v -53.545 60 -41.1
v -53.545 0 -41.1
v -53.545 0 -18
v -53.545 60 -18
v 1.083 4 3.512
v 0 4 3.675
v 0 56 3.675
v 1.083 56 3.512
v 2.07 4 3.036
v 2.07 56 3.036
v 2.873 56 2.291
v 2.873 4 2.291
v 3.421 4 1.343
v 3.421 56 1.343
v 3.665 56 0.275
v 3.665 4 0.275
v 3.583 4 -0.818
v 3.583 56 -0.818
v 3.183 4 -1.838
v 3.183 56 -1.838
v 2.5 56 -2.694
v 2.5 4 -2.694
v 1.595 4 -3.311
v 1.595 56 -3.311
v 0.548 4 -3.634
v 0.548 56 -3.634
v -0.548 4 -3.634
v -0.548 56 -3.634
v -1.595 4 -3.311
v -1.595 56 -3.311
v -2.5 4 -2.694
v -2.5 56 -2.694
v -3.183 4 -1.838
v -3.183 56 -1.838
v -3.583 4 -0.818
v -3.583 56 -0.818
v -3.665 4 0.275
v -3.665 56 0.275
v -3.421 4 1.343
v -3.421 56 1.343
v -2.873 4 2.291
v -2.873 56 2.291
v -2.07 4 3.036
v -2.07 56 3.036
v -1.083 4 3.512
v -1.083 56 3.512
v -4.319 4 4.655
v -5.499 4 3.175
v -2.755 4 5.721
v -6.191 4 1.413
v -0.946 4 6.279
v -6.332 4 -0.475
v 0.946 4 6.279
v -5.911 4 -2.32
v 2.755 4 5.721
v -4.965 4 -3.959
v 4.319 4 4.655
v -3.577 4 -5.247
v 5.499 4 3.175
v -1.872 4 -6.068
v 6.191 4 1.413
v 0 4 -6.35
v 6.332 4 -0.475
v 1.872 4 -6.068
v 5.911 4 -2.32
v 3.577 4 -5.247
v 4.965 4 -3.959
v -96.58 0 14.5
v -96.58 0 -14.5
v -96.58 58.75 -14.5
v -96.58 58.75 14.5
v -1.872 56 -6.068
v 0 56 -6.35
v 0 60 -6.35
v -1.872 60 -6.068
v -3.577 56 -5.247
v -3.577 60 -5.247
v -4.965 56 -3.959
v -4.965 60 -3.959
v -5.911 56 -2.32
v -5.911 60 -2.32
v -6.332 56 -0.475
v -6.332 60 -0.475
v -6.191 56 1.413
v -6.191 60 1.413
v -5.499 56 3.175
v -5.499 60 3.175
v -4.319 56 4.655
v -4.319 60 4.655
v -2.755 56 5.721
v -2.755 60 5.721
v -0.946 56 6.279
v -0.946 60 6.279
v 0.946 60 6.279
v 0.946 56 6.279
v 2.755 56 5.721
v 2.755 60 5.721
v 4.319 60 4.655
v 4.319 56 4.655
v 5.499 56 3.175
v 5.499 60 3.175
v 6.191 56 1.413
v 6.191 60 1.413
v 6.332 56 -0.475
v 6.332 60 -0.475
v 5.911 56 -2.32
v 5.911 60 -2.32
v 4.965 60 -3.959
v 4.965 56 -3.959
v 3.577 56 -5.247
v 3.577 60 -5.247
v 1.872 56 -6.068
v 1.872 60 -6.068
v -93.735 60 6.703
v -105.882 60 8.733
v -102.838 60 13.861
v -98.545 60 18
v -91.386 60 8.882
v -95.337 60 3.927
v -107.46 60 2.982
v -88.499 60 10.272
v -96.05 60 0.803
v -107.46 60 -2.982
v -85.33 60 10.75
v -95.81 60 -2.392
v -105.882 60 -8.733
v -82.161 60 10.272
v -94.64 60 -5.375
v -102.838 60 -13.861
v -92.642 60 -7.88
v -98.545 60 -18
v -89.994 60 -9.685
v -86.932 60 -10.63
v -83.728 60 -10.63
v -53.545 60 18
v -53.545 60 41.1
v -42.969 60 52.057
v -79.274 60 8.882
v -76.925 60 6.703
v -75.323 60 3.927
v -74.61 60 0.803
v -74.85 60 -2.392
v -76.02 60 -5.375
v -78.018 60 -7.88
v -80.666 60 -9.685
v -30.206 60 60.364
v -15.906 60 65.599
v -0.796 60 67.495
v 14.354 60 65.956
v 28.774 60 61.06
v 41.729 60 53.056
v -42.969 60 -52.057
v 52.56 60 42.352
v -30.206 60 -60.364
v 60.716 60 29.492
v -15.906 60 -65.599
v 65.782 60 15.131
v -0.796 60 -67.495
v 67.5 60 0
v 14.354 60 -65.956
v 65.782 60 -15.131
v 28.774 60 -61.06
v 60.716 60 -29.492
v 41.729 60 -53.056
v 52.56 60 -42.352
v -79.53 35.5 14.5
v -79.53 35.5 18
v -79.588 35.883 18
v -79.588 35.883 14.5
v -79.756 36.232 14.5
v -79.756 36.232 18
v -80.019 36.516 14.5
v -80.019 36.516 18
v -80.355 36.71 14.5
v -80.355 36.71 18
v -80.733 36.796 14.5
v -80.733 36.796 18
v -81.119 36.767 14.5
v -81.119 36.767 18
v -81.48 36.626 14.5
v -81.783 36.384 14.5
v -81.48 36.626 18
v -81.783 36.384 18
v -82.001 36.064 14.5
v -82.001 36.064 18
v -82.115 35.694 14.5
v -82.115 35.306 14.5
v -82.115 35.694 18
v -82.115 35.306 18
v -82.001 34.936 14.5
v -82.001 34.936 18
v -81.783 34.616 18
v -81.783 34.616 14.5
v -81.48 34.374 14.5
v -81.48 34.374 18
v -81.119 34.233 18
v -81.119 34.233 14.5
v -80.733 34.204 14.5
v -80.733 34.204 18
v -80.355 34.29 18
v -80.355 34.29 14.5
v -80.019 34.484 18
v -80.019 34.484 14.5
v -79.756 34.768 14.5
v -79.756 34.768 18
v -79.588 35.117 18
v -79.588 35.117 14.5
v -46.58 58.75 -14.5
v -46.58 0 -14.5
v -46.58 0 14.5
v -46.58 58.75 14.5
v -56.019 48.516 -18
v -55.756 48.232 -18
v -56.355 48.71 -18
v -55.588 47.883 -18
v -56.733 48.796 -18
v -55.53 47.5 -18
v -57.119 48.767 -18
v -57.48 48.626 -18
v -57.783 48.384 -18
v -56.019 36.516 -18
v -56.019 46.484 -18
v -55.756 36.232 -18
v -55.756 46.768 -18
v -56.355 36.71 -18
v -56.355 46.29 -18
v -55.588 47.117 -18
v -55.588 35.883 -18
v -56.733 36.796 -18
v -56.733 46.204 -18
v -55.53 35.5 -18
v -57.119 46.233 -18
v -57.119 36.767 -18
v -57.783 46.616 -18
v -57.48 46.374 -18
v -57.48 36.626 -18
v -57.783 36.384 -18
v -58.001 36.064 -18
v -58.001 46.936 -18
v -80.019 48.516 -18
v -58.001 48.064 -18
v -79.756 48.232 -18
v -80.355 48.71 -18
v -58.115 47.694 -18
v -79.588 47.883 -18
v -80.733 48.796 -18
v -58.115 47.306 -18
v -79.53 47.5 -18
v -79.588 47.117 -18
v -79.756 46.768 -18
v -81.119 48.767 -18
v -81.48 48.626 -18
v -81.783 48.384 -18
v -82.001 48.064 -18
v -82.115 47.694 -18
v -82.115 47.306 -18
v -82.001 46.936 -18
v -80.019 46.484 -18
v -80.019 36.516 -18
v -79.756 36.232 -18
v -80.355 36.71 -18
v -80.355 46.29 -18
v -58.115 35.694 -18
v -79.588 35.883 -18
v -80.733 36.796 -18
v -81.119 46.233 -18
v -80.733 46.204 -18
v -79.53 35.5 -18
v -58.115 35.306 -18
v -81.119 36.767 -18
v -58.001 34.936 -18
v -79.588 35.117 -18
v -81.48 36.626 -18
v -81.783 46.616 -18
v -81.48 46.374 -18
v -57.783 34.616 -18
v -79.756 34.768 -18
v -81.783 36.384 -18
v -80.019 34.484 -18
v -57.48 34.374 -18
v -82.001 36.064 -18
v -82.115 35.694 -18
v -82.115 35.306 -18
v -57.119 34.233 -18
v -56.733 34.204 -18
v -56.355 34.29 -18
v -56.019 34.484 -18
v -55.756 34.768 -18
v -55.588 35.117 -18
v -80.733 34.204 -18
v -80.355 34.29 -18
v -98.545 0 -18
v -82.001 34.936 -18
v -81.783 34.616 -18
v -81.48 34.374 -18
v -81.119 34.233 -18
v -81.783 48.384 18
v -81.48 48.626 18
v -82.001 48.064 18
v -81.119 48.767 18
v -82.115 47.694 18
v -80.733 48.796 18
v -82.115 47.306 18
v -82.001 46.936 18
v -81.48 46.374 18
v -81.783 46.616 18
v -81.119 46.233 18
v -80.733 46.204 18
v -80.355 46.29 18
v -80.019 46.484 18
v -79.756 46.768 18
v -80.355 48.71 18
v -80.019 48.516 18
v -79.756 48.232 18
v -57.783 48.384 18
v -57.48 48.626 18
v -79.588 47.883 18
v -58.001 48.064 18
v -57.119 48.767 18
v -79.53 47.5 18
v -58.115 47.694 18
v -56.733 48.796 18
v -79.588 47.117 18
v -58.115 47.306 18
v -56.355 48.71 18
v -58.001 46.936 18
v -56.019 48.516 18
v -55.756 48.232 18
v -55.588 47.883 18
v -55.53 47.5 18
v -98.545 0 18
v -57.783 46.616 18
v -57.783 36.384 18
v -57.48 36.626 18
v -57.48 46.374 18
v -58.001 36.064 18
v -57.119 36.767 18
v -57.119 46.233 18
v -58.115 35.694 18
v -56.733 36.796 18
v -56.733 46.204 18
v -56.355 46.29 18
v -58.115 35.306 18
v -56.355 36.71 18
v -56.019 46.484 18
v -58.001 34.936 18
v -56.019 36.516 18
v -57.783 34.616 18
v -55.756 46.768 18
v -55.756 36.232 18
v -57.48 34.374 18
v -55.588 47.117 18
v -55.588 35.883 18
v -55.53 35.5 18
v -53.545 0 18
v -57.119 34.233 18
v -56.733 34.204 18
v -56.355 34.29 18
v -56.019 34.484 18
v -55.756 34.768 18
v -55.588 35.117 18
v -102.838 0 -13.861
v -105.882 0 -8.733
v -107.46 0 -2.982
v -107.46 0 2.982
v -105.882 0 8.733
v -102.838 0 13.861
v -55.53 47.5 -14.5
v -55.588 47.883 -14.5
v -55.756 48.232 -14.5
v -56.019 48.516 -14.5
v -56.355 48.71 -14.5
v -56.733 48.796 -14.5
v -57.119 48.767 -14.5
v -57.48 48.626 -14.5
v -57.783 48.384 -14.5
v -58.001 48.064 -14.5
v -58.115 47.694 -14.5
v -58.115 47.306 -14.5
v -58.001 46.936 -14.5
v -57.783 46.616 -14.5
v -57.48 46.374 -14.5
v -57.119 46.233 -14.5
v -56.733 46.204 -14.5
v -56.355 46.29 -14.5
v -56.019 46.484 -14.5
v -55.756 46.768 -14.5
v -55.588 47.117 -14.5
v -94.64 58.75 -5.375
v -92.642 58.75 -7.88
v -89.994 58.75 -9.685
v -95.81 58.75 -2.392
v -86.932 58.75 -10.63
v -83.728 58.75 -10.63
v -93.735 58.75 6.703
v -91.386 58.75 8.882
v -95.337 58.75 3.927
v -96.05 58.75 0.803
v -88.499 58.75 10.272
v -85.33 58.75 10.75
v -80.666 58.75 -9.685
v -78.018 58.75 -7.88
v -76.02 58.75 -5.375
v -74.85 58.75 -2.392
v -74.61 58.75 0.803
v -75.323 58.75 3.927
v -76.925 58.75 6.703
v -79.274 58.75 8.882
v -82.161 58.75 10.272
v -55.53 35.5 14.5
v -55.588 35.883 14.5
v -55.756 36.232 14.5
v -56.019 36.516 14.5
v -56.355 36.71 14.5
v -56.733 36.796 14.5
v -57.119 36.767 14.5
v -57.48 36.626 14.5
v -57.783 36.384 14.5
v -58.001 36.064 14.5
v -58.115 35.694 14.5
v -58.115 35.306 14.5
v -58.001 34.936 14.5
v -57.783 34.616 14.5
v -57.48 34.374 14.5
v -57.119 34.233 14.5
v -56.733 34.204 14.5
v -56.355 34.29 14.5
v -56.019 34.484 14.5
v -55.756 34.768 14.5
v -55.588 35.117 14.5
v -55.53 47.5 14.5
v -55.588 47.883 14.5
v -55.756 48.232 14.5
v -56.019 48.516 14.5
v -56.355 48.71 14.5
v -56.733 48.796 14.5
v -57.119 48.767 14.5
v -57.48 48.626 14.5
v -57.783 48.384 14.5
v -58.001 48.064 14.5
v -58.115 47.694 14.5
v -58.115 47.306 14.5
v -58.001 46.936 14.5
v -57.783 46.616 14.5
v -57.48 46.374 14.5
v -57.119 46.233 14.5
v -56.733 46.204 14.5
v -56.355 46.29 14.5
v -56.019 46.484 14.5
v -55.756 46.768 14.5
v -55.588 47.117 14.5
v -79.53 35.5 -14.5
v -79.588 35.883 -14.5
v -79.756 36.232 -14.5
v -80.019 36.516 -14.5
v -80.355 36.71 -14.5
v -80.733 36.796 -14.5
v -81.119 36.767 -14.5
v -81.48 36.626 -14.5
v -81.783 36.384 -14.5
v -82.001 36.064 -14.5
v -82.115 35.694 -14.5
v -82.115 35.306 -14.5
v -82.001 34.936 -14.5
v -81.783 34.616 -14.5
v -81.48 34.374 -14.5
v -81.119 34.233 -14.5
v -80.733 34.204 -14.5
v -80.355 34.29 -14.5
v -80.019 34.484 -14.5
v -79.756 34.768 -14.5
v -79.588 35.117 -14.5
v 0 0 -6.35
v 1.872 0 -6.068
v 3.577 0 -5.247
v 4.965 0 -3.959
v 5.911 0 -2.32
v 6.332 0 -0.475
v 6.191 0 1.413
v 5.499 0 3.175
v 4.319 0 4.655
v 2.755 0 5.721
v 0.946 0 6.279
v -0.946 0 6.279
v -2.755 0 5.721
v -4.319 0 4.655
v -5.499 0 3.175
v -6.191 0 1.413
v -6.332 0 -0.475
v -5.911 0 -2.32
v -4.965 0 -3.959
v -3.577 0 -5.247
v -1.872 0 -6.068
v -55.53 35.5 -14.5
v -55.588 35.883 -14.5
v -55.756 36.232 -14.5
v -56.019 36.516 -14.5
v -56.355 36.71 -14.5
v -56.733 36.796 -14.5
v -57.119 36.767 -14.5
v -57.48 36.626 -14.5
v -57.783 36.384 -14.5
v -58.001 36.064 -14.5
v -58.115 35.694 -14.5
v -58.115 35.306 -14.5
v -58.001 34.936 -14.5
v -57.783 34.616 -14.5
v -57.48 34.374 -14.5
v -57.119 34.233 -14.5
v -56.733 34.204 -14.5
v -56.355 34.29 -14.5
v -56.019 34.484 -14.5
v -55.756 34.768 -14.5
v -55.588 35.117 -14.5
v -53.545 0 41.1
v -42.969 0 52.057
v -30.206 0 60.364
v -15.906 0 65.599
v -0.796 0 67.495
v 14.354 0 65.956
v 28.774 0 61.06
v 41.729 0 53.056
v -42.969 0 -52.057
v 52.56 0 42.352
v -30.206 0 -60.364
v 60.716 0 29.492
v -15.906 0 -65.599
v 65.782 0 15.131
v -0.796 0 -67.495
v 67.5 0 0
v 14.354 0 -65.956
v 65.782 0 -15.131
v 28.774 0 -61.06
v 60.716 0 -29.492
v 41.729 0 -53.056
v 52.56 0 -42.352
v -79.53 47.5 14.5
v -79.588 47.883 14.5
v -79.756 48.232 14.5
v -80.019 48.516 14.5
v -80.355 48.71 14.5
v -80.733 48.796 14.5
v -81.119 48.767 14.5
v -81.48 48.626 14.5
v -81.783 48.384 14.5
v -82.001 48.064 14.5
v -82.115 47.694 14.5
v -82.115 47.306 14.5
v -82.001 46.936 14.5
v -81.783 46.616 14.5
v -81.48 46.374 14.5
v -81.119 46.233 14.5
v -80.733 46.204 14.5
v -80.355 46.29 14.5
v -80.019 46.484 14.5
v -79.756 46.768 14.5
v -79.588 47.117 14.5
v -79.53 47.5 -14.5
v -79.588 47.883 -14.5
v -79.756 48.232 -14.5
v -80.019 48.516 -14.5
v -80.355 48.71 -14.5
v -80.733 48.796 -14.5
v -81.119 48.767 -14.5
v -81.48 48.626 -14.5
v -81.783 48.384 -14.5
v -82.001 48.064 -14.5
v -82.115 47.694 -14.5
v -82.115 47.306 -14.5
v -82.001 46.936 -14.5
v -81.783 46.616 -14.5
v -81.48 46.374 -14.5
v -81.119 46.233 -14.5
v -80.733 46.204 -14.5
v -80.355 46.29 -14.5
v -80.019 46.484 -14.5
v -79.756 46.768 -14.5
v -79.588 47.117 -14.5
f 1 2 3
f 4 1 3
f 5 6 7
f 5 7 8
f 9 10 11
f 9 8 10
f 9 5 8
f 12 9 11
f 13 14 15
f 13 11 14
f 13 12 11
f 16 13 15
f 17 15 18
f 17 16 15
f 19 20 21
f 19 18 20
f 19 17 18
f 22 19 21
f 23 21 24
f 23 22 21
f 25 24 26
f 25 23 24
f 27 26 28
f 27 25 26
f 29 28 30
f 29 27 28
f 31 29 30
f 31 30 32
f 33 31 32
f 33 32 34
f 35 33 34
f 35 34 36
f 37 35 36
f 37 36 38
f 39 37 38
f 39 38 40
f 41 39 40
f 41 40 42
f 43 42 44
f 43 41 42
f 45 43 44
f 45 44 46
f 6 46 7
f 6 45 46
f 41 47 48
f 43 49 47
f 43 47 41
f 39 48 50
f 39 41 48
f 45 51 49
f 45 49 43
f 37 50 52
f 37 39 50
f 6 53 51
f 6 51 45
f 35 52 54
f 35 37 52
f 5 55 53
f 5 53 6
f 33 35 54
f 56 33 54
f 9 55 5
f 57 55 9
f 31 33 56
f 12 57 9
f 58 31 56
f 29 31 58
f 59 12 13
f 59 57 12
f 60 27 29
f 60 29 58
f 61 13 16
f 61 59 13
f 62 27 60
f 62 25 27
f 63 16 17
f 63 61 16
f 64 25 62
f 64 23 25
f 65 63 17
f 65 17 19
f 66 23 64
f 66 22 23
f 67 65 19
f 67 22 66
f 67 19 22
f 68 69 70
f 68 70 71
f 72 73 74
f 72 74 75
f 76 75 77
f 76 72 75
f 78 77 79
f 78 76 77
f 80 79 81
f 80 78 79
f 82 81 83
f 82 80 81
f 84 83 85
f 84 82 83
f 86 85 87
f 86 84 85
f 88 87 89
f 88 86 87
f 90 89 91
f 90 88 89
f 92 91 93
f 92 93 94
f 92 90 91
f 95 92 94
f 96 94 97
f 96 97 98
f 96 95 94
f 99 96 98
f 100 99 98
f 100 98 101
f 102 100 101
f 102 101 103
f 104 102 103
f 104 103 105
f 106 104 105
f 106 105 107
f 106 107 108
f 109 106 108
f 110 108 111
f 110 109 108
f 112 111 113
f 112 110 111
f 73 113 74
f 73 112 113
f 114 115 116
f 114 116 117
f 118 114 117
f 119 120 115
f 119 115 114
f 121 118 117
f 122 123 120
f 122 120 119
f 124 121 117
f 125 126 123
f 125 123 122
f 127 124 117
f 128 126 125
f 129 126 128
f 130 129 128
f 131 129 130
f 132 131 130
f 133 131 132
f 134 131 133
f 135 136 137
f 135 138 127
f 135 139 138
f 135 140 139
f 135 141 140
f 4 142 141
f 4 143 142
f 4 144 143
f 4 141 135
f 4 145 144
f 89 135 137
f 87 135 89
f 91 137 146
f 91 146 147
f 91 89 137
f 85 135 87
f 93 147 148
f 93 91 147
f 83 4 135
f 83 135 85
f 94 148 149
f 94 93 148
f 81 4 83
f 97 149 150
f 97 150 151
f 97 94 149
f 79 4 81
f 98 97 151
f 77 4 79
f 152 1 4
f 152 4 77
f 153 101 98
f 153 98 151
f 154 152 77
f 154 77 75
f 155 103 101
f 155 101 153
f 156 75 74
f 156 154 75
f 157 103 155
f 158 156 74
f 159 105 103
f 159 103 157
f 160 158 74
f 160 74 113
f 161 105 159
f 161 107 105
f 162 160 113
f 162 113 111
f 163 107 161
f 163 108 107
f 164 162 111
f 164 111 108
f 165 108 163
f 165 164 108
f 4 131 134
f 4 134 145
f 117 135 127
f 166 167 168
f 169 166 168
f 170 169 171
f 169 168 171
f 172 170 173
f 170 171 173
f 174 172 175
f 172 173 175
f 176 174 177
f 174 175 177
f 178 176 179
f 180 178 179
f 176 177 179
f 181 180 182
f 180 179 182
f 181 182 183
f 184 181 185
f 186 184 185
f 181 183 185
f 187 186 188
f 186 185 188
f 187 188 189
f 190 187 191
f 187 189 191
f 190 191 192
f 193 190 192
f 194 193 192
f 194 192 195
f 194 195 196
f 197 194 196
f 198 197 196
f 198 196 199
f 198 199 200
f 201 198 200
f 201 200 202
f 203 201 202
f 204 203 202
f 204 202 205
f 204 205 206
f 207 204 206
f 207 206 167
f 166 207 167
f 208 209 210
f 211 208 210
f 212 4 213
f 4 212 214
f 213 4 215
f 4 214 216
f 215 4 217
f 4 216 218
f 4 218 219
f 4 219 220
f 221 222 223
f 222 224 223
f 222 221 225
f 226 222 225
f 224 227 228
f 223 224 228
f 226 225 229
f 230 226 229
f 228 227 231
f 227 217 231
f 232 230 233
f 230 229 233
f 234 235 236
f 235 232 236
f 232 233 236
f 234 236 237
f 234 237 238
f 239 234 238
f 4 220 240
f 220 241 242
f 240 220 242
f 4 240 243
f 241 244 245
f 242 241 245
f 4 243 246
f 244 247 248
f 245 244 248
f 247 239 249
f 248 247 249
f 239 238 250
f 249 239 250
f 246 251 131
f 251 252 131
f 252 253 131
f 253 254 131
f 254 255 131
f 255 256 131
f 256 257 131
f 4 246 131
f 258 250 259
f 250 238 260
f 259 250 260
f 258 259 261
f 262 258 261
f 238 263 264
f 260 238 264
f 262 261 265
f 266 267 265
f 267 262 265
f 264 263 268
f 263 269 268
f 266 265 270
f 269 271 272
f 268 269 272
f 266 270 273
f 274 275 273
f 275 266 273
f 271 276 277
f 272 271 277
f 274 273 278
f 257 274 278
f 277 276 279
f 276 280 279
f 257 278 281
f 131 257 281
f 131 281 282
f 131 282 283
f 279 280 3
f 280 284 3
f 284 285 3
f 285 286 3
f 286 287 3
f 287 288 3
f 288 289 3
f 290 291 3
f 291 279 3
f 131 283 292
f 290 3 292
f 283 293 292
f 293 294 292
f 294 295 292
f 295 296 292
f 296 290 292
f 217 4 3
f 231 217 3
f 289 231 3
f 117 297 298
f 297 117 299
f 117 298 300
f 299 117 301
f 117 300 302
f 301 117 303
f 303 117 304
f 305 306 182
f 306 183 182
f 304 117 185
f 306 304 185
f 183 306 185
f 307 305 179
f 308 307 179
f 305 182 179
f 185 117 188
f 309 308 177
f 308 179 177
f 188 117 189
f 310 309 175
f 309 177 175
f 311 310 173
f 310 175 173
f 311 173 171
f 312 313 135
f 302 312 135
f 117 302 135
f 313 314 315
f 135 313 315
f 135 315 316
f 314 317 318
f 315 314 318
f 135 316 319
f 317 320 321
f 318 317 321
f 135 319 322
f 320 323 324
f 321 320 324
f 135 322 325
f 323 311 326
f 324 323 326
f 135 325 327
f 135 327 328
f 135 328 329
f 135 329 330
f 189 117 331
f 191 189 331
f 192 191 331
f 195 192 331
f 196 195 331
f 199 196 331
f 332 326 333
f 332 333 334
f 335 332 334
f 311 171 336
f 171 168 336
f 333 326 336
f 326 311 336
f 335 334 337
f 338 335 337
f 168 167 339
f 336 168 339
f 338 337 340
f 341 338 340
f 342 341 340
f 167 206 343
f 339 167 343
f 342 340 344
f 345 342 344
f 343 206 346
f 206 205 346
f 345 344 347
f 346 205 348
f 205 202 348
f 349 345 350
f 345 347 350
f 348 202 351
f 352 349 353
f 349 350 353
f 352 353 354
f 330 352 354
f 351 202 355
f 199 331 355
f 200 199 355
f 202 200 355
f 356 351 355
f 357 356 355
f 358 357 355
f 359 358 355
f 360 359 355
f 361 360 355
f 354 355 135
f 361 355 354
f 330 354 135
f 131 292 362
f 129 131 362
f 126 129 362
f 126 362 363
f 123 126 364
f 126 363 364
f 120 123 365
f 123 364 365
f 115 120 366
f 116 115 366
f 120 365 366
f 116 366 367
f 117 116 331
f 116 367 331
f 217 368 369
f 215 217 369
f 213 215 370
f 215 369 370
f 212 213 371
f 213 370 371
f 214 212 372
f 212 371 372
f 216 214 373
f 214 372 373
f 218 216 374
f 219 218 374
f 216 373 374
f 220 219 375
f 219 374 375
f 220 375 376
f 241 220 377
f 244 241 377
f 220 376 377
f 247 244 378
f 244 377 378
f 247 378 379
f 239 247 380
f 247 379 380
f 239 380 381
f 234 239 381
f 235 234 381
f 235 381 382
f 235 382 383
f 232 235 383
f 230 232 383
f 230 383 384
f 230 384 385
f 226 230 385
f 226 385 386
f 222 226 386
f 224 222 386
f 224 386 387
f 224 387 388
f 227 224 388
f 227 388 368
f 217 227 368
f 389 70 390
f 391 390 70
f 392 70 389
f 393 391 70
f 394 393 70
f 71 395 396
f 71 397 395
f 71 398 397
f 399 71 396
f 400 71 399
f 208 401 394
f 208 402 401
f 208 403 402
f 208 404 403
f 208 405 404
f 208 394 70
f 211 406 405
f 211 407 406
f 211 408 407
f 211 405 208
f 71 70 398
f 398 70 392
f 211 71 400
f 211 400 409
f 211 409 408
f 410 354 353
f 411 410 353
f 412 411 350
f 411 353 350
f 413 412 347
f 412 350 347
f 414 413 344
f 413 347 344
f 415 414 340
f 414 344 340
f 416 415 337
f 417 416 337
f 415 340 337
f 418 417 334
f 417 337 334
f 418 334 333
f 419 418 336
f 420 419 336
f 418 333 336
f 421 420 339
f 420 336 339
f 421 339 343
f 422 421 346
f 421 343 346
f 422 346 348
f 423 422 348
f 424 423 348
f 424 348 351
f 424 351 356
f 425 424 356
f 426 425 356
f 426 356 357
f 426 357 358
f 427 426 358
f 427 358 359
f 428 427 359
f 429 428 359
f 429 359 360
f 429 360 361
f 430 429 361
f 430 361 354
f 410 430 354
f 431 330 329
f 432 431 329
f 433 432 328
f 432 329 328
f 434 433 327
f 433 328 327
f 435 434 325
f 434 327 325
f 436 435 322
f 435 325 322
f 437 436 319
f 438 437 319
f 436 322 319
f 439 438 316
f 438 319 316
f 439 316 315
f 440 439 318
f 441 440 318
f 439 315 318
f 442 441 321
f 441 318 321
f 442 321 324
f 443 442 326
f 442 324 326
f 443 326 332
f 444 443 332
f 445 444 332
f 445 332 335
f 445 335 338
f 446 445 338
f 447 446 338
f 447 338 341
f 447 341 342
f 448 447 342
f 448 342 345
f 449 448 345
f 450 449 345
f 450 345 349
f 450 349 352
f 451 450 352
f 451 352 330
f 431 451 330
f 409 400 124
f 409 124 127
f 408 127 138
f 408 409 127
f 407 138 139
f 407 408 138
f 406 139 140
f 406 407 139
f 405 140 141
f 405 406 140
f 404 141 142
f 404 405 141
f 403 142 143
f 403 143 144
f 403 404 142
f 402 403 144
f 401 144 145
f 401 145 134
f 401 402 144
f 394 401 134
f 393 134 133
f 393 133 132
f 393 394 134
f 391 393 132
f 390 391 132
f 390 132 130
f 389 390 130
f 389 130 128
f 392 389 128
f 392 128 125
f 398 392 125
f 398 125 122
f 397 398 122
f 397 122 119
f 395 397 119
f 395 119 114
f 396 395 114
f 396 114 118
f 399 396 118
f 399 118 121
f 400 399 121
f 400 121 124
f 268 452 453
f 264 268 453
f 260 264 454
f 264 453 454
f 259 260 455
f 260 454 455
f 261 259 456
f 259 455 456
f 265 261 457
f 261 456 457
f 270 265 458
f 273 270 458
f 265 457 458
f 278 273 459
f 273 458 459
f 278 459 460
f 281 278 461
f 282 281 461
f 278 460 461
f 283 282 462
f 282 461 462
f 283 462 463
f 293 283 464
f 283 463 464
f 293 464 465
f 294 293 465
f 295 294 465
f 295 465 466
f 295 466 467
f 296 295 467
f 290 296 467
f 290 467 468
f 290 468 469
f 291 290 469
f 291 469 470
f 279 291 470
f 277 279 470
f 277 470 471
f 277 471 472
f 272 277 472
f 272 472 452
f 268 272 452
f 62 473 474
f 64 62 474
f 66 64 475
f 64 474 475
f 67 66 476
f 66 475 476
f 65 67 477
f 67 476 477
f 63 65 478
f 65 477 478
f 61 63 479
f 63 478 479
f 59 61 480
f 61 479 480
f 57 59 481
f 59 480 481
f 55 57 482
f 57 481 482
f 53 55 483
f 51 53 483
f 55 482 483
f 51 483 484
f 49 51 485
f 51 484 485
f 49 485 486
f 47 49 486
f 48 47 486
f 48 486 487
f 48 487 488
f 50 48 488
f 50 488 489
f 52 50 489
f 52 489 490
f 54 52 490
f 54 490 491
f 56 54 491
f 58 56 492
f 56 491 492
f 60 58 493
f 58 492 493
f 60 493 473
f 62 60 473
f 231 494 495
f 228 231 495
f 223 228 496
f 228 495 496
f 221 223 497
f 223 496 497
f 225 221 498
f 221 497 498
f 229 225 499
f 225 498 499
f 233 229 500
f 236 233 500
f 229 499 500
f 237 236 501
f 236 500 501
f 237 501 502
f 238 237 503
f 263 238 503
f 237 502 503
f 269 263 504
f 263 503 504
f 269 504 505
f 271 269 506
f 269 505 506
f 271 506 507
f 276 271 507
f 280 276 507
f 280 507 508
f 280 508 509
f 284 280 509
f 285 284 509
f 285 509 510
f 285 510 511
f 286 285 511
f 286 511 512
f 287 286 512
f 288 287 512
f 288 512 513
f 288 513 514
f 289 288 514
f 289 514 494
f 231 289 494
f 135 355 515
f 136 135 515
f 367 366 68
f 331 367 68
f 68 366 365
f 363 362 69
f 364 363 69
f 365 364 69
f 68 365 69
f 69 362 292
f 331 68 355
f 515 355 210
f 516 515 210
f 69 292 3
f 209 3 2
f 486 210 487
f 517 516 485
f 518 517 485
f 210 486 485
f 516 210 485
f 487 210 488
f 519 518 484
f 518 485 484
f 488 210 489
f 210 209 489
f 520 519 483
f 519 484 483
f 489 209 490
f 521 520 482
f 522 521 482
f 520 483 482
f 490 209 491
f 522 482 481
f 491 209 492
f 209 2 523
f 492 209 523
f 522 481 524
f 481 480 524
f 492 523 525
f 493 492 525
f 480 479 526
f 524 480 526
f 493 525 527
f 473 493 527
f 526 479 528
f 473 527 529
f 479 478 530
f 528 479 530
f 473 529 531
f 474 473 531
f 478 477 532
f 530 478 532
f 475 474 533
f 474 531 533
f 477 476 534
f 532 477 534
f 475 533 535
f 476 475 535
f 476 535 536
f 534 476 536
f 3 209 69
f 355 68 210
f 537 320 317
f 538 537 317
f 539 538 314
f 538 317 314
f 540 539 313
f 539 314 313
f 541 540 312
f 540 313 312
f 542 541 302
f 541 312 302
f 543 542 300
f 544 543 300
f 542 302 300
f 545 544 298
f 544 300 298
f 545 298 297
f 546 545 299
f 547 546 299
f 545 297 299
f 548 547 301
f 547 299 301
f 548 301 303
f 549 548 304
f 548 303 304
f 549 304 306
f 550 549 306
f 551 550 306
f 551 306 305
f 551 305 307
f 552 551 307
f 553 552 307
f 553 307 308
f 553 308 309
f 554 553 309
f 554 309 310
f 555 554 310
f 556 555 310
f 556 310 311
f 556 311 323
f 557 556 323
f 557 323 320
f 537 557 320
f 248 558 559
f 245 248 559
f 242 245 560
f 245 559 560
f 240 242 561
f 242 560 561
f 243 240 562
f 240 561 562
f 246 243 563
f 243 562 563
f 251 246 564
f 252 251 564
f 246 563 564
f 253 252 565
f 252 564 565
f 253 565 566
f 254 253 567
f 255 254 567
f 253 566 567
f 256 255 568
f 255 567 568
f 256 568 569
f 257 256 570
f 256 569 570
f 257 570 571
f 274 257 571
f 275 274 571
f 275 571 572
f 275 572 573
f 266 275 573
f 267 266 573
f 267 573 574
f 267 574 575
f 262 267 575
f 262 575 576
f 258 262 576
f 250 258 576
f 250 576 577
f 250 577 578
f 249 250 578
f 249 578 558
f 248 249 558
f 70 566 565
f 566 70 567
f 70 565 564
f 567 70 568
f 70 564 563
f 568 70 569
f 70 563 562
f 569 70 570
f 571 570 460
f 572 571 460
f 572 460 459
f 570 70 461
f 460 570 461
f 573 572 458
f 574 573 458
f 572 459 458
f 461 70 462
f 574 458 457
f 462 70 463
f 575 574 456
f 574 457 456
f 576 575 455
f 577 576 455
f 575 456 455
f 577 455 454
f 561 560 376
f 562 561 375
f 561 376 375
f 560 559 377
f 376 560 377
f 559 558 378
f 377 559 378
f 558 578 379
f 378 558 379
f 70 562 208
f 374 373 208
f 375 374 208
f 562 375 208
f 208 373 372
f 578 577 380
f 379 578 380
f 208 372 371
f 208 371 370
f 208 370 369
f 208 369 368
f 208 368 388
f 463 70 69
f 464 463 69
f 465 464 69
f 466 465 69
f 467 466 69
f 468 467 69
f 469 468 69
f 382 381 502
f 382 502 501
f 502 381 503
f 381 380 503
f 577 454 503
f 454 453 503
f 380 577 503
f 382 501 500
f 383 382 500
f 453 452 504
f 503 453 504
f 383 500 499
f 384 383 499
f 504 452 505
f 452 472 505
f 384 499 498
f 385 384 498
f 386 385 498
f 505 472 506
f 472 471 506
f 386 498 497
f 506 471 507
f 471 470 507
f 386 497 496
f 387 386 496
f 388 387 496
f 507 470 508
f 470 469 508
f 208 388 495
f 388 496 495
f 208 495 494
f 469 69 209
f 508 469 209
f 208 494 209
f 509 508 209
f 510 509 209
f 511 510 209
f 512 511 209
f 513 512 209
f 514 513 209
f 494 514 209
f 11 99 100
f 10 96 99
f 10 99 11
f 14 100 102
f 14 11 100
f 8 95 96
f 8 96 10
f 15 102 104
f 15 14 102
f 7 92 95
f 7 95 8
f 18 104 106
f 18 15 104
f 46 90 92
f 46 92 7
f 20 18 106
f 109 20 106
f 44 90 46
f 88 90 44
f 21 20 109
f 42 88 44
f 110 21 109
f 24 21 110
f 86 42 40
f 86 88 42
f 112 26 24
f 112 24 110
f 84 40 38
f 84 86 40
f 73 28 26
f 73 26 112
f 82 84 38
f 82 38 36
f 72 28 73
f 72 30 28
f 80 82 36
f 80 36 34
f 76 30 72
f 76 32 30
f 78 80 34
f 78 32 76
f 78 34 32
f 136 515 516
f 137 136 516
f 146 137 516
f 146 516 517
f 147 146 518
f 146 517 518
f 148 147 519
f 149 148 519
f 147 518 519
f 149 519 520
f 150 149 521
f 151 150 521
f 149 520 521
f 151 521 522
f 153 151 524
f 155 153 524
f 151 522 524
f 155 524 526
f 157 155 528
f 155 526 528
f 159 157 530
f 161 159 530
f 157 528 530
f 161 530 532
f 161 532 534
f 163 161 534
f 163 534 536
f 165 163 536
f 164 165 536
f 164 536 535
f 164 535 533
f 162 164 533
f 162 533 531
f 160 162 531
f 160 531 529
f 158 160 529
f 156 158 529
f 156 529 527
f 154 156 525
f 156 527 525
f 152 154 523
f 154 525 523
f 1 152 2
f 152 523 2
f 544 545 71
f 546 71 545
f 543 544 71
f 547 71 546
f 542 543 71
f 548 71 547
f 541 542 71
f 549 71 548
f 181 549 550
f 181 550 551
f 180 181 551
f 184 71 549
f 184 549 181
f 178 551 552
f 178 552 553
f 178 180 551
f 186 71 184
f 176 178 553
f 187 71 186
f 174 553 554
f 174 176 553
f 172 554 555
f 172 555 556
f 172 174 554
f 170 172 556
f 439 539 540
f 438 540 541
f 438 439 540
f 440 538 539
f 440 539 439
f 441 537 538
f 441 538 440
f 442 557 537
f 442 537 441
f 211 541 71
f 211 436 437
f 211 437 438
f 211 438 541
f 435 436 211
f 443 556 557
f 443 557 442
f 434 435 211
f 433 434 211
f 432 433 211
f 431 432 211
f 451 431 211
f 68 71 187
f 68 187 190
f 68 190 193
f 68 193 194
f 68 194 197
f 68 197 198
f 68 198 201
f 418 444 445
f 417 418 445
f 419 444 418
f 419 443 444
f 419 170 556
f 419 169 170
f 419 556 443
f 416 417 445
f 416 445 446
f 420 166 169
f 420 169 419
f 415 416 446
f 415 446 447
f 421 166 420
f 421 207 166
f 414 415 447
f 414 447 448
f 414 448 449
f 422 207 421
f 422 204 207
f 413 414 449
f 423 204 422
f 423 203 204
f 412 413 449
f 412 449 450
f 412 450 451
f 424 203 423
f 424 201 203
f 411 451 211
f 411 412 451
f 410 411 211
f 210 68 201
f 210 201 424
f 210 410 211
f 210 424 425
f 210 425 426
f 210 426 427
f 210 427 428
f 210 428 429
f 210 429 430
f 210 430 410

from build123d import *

# Parameters (mm, degrees)
ESQUISSE1_R             = 10.75
ESQUISSE1_R_2           = 3.675
BOSS_EXTRU_1_DEPTH      = 60
ESQUISSE2_W             = 50
ESQUISSE2_H             = 29
ENL_V_MAT_EXTRU_1_DEPTH = 58.75
D_GAGEMENT_M21_D        = 2.6
ESQUISSE4_R             = 6.35
ENL_V_MAT_EXTRU_2_DEPTH = 4
ENL_V_START             = -4
ESQUISSE5_R             = 6.35
ENL_V_MAT_EXTRU_3_DEPTH = 4


with BuildPart() as part:
    # Esquisse1 → Boss.-Extru.1 (new body)
    with BuildSketch(Plane(origin=(0, 0, 0), x_dir=(1, 0, 0), z_dir=(0, 1, 0))):
        with BuildLine():
            Line((-53.54472285, -18), (-53.54472285, -41.100032298))
            ThreePointArc((-53.54472285, -41.100032298), (67.5, 0), (-53.54472285, 41.100032298))
            Line((-53.54472285, 41.100032298), (-53.54472285, 18))
            Line((-53.54472285, 18), (-98.54472285, 18))
            ThreePointArc((-98.54472285, 18), (-107.66, 0), (-98.54472285, -18))
            Line((-98.54472285, -18), (-53.54472285, -18))
        make_face()
        with Locations(Location((-85.33, 0, 0), (0, 0, 270))):
            Circle(ESQUISSE1_R, mode=Mode.SUBTRACT)
        with Locations(Location((0, 0, 0), (0, 0, 270))):
            Circle(ESQUISSE1_R_2, mode=Mode.SUBTRACT)
    extrude(amount=BOSS_EXTRU_1_DEPTH)

    # Esquisse2 → Enlèv. mat.-Extru.1 (cut)
    with BuildSketch(Plane.XZ):
        with Locations((-71.58, 0)):
            Rectangle(ESQUISSE2_W, ESQUISSE2_H)
    extrude(amount=-ENL_V_MAT_EXTRU_1_DEPTH, mode=Mode.SUBTRACT)

    # Dégagement M21 (through all)
    with Locations(Plane(origin=(-56.83, 47.5, -18), x_dir=(-1, 0, 0), z_dir=(0, 0, -1))):
        with Locations((0, 0), (24, 0), (24, -12), (0, -12)):
            Hole(D_GAGEMENT_M21_D / 2)

    # Esquisse4 → Enlèv. mat.-Extru.2 (cut)
    with BuildSketch(Plane.XZ):
        with Locations(Location((0, 0, 0), (0, 0, 270))):
            Circle(ESQUISSE4_R)
    extrude(amount=-ENL_V_MAT_EXTRU_2_DEPTH, mode=Mode.SUBTRACT)

    # Esquisse5 → Enlèv. mat.-Extru.3 (cut)
    with BuildSketch(Plane(origin=(0, 60, 0), x_dir=(1, 0, 0), z_dir=(0, 1, 0)).offset(ENL_V_START)):
        with Locations(Location((0, 0, 0), (0, 0, 90))):
            Circle(ESQUISSE5_R)
    extrude(amount=ENL_V_MAT_EXTRU_3_DEPTH, mode=Mode.SUBTRACT)


solid = part.part
